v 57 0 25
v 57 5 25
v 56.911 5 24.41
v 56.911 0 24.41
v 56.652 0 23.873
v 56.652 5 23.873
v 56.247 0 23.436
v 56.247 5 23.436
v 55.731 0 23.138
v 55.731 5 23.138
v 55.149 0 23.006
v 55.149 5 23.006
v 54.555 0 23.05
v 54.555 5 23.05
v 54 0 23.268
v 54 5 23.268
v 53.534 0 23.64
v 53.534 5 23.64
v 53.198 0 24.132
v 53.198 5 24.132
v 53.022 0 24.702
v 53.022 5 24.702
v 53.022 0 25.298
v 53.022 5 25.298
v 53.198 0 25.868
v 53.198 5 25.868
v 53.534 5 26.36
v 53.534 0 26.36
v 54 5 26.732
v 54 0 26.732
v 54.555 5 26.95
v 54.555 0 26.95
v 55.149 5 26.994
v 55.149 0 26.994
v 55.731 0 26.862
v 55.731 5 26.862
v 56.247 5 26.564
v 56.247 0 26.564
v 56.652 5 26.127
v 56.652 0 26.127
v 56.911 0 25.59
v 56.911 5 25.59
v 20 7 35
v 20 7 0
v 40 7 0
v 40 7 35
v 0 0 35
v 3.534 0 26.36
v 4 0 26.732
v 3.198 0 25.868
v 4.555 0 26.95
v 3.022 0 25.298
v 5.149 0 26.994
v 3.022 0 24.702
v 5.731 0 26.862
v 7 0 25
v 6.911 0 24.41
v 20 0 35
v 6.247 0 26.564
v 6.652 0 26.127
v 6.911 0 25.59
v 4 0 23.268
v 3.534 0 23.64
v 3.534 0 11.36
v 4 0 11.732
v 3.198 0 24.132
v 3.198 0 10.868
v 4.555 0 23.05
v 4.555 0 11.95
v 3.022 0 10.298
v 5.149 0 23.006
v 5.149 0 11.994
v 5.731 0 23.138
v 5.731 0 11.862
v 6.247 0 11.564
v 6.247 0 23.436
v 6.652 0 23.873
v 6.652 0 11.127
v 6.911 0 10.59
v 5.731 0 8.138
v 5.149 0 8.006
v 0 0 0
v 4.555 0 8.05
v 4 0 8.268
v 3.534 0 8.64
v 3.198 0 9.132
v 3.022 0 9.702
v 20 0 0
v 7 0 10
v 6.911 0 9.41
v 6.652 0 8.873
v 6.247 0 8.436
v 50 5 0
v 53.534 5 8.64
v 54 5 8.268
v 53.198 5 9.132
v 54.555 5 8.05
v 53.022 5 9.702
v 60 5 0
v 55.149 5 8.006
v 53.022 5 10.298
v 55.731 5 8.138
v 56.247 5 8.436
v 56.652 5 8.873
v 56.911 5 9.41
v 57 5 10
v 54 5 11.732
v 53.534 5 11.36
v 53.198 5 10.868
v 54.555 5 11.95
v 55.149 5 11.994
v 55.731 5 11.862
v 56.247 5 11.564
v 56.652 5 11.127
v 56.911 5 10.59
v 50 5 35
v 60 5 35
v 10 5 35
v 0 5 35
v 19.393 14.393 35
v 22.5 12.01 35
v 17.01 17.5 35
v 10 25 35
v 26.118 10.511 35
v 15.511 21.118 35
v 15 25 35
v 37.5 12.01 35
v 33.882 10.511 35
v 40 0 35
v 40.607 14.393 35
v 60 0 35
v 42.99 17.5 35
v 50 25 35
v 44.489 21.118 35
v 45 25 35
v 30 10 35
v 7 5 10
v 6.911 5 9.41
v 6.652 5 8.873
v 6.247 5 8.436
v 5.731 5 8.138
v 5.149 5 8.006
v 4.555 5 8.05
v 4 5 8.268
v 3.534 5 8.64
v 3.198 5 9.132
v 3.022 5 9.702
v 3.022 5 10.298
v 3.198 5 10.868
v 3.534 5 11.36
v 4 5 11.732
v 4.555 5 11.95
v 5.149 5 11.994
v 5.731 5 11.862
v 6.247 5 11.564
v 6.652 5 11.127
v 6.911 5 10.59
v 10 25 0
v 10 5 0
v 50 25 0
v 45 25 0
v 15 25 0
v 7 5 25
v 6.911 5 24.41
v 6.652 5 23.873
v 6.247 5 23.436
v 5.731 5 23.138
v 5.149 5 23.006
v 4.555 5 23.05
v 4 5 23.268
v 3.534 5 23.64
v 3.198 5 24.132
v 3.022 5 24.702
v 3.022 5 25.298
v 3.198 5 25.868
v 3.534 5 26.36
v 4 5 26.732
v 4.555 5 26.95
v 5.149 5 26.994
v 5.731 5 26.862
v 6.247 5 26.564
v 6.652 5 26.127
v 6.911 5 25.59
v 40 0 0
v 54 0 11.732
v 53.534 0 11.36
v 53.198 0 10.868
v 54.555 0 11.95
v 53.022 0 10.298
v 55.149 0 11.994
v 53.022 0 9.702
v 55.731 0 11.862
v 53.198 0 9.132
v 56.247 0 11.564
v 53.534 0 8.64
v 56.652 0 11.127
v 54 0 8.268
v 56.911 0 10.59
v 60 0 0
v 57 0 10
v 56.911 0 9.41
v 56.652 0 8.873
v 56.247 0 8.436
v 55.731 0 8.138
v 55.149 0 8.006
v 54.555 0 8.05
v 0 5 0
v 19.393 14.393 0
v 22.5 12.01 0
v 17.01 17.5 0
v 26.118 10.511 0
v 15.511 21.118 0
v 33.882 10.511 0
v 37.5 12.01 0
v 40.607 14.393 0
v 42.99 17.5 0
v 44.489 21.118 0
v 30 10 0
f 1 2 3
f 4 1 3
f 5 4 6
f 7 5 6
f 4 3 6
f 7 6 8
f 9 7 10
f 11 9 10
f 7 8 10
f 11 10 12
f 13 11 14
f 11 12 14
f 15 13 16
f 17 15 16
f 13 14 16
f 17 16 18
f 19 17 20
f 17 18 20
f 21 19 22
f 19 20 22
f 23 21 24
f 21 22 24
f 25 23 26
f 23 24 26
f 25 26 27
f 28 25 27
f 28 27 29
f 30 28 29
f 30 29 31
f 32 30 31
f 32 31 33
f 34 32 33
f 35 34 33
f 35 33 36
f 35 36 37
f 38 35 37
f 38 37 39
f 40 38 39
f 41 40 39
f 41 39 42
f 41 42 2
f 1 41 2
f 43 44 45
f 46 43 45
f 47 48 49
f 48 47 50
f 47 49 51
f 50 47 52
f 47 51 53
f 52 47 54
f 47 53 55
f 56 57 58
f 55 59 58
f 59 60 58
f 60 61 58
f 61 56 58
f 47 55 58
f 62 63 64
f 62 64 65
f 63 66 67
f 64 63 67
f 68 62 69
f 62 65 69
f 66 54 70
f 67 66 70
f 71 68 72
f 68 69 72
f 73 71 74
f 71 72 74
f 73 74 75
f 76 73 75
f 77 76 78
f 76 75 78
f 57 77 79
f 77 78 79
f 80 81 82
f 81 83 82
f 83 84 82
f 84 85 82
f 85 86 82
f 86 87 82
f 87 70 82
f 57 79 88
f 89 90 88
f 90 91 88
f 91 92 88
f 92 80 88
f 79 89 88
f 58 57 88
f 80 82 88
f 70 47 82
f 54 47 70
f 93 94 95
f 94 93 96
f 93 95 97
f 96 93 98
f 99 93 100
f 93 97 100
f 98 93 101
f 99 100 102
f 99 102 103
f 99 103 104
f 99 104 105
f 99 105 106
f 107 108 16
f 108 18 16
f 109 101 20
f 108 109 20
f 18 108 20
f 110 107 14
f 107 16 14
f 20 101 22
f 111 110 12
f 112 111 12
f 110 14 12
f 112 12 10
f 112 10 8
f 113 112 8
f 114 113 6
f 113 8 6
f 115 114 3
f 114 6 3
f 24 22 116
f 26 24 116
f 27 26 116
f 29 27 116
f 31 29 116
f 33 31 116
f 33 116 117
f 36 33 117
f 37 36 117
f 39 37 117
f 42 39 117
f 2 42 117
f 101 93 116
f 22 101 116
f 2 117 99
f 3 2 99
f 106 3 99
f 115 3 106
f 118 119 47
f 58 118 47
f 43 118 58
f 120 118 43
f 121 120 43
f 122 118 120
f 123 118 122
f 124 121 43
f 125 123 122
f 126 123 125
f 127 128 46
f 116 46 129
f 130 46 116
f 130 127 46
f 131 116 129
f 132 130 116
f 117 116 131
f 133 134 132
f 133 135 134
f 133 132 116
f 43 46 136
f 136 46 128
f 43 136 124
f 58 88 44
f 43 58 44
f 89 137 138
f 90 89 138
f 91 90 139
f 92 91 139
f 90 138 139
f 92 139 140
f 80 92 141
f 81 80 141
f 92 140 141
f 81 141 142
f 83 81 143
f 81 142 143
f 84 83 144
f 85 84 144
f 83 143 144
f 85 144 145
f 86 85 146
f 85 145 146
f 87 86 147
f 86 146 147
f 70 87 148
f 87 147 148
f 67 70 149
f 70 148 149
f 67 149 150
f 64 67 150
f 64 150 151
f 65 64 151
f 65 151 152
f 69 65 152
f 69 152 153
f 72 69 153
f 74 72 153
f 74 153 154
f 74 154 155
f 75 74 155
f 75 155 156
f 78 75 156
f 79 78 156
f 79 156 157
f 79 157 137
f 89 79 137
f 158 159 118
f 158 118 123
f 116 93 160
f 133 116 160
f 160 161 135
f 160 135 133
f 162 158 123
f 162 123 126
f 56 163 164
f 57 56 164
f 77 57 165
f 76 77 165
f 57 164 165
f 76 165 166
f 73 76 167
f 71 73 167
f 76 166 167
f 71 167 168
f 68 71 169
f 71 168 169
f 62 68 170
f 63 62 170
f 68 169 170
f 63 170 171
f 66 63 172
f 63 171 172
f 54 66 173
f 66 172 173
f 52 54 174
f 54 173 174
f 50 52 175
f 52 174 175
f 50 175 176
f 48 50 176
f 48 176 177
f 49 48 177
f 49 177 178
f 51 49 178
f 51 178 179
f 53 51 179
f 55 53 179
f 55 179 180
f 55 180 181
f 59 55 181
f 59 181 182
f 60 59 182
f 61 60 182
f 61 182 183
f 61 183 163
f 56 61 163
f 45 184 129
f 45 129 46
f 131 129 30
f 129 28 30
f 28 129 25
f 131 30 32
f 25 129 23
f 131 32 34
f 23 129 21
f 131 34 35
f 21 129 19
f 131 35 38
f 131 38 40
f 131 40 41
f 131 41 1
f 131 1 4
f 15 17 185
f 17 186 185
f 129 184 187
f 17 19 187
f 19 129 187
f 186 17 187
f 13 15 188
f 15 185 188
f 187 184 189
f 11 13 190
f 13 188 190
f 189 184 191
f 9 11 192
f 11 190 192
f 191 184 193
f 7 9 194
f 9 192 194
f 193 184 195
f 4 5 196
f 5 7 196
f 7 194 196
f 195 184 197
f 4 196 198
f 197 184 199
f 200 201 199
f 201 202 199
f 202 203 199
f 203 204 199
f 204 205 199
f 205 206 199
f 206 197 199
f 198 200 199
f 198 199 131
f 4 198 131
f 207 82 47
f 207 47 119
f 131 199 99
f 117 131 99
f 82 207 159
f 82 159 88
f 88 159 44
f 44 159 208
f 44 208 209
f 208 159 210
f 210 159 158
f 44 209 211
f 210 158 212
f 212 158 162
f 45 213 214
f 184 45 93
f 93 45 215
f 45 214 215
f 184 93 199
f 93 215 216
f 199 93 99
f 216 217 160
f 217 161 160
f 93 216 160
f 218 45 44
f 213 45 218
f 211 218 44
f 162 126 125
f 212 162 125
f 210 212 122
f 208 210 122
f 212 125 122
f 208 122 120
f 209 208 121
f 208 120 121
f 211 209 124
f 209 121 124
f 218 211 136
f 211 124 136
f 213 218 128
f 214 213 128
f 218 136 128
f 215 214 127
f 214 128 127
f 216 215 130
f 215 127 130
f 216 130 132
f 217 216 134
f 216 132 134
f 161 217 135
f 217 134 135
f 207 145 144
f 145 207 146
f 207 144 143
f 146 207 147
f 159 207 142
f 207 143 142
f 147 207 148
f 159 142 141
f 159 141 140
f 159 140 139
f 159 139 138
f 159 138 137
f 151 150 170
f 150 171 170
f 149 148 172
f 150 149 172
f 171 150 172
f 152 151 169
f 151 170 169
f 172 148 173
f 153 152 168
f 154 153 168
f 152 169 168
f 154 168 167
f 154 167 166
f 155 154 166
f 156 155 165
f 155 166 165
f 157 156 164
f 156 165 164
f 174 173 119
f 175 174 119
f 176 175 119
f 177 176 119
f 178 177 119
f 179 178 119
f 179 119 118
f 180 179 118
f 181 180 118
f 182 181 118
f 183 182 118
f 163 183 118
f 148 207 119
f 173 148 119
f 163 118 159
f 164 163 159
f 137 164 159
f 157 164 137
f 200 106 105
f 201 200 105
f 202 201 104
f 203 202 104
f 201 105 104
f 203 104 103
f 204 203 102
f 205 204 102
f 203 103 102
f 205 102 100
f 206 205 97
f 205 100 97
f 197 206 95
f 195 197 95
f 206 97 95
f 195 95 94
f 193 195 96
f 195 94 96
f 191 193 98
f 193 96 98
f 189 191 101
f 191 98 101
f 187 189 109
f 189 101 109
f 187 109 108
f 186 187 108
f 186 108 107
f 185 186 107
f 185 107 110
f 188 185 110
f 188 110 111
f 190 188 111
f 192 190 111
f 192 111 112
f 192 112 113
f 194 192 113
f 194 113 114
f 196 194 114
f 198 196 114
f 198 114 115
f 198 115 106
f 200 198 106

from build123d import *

# Parameters (mm, degrees)
IZIM1_W                     = 60
IZIM1_H                     = 25
Y_KSEKLIK_EKSTR_ZYON1_DEPTH = 35
IZIM2_W                     = 10
IZIM2_H                     = 20
IZIM2_W_2                   = 20
IZIM2_H_2                   = 7
KES_EKSTR_ZYON2_DEPTH       = 36
IZIM3_R                     = 2
KES_EKSTR_ZYON3_DEPTH       = 6


with BuildPart() as part:
    # Çizim1 → Yükseklik-Ekstrüzyon1 (new body)
    with BuildSketch(Plane.XY):
        with Locations((30, 12.5)):
            Rectangle(IZIM1_W, IZIM1_H)
    extrude(amount=Y_KSEKLIK_EKSTR_ZYON1_DEPTH)

    # Çizim2 → Kes-Ekstrüzyon2 (cut, through all)
    with BuildSketch(Plane.XY.offset(35)):
        with Locations((55, 15)):
            Rectangle(IZIM2_W, IZIM2_H)
        with BuildLine():
            Line((45, 25), (15, 25))
            ThreePointArc((15, 25), (30, 10), (45, 25))
        make_face()
        with Locations((5, 15)):
            Rectangle(IZIM2_W, IZIM2_H)
        with Locations((30, 3.5)):
            Rectangle(IZIM2_W_2, IZIM2_H_2)
    extrude(amount=-KES_EKSTR_ZYON2_DEPTH, mode=Mode.SUBTRACT)

    # Çizim3 → Kes-Ekstrüzyon3 (cut, through all)
    with BuildSketch(Plane(origin=(0, 5, 0), x_dir=(1, 0, 0), z_dir=(0, 1, 0))):
        with Locations((5, -25)):
            Circle(IZIM3_R)
        with Locations((5, -10)):
            Circle(IZIM3_R)
        with Locations((55, -10)):
            Circle(IZIM3_R)
        with Locations((55, -25)):
            Circle(IZIM3_R)
    extrude(amount=-KES_EKSTR_ZYON3_DEPTH, mode=Mode.SUBTRACT)


solid = part.part
